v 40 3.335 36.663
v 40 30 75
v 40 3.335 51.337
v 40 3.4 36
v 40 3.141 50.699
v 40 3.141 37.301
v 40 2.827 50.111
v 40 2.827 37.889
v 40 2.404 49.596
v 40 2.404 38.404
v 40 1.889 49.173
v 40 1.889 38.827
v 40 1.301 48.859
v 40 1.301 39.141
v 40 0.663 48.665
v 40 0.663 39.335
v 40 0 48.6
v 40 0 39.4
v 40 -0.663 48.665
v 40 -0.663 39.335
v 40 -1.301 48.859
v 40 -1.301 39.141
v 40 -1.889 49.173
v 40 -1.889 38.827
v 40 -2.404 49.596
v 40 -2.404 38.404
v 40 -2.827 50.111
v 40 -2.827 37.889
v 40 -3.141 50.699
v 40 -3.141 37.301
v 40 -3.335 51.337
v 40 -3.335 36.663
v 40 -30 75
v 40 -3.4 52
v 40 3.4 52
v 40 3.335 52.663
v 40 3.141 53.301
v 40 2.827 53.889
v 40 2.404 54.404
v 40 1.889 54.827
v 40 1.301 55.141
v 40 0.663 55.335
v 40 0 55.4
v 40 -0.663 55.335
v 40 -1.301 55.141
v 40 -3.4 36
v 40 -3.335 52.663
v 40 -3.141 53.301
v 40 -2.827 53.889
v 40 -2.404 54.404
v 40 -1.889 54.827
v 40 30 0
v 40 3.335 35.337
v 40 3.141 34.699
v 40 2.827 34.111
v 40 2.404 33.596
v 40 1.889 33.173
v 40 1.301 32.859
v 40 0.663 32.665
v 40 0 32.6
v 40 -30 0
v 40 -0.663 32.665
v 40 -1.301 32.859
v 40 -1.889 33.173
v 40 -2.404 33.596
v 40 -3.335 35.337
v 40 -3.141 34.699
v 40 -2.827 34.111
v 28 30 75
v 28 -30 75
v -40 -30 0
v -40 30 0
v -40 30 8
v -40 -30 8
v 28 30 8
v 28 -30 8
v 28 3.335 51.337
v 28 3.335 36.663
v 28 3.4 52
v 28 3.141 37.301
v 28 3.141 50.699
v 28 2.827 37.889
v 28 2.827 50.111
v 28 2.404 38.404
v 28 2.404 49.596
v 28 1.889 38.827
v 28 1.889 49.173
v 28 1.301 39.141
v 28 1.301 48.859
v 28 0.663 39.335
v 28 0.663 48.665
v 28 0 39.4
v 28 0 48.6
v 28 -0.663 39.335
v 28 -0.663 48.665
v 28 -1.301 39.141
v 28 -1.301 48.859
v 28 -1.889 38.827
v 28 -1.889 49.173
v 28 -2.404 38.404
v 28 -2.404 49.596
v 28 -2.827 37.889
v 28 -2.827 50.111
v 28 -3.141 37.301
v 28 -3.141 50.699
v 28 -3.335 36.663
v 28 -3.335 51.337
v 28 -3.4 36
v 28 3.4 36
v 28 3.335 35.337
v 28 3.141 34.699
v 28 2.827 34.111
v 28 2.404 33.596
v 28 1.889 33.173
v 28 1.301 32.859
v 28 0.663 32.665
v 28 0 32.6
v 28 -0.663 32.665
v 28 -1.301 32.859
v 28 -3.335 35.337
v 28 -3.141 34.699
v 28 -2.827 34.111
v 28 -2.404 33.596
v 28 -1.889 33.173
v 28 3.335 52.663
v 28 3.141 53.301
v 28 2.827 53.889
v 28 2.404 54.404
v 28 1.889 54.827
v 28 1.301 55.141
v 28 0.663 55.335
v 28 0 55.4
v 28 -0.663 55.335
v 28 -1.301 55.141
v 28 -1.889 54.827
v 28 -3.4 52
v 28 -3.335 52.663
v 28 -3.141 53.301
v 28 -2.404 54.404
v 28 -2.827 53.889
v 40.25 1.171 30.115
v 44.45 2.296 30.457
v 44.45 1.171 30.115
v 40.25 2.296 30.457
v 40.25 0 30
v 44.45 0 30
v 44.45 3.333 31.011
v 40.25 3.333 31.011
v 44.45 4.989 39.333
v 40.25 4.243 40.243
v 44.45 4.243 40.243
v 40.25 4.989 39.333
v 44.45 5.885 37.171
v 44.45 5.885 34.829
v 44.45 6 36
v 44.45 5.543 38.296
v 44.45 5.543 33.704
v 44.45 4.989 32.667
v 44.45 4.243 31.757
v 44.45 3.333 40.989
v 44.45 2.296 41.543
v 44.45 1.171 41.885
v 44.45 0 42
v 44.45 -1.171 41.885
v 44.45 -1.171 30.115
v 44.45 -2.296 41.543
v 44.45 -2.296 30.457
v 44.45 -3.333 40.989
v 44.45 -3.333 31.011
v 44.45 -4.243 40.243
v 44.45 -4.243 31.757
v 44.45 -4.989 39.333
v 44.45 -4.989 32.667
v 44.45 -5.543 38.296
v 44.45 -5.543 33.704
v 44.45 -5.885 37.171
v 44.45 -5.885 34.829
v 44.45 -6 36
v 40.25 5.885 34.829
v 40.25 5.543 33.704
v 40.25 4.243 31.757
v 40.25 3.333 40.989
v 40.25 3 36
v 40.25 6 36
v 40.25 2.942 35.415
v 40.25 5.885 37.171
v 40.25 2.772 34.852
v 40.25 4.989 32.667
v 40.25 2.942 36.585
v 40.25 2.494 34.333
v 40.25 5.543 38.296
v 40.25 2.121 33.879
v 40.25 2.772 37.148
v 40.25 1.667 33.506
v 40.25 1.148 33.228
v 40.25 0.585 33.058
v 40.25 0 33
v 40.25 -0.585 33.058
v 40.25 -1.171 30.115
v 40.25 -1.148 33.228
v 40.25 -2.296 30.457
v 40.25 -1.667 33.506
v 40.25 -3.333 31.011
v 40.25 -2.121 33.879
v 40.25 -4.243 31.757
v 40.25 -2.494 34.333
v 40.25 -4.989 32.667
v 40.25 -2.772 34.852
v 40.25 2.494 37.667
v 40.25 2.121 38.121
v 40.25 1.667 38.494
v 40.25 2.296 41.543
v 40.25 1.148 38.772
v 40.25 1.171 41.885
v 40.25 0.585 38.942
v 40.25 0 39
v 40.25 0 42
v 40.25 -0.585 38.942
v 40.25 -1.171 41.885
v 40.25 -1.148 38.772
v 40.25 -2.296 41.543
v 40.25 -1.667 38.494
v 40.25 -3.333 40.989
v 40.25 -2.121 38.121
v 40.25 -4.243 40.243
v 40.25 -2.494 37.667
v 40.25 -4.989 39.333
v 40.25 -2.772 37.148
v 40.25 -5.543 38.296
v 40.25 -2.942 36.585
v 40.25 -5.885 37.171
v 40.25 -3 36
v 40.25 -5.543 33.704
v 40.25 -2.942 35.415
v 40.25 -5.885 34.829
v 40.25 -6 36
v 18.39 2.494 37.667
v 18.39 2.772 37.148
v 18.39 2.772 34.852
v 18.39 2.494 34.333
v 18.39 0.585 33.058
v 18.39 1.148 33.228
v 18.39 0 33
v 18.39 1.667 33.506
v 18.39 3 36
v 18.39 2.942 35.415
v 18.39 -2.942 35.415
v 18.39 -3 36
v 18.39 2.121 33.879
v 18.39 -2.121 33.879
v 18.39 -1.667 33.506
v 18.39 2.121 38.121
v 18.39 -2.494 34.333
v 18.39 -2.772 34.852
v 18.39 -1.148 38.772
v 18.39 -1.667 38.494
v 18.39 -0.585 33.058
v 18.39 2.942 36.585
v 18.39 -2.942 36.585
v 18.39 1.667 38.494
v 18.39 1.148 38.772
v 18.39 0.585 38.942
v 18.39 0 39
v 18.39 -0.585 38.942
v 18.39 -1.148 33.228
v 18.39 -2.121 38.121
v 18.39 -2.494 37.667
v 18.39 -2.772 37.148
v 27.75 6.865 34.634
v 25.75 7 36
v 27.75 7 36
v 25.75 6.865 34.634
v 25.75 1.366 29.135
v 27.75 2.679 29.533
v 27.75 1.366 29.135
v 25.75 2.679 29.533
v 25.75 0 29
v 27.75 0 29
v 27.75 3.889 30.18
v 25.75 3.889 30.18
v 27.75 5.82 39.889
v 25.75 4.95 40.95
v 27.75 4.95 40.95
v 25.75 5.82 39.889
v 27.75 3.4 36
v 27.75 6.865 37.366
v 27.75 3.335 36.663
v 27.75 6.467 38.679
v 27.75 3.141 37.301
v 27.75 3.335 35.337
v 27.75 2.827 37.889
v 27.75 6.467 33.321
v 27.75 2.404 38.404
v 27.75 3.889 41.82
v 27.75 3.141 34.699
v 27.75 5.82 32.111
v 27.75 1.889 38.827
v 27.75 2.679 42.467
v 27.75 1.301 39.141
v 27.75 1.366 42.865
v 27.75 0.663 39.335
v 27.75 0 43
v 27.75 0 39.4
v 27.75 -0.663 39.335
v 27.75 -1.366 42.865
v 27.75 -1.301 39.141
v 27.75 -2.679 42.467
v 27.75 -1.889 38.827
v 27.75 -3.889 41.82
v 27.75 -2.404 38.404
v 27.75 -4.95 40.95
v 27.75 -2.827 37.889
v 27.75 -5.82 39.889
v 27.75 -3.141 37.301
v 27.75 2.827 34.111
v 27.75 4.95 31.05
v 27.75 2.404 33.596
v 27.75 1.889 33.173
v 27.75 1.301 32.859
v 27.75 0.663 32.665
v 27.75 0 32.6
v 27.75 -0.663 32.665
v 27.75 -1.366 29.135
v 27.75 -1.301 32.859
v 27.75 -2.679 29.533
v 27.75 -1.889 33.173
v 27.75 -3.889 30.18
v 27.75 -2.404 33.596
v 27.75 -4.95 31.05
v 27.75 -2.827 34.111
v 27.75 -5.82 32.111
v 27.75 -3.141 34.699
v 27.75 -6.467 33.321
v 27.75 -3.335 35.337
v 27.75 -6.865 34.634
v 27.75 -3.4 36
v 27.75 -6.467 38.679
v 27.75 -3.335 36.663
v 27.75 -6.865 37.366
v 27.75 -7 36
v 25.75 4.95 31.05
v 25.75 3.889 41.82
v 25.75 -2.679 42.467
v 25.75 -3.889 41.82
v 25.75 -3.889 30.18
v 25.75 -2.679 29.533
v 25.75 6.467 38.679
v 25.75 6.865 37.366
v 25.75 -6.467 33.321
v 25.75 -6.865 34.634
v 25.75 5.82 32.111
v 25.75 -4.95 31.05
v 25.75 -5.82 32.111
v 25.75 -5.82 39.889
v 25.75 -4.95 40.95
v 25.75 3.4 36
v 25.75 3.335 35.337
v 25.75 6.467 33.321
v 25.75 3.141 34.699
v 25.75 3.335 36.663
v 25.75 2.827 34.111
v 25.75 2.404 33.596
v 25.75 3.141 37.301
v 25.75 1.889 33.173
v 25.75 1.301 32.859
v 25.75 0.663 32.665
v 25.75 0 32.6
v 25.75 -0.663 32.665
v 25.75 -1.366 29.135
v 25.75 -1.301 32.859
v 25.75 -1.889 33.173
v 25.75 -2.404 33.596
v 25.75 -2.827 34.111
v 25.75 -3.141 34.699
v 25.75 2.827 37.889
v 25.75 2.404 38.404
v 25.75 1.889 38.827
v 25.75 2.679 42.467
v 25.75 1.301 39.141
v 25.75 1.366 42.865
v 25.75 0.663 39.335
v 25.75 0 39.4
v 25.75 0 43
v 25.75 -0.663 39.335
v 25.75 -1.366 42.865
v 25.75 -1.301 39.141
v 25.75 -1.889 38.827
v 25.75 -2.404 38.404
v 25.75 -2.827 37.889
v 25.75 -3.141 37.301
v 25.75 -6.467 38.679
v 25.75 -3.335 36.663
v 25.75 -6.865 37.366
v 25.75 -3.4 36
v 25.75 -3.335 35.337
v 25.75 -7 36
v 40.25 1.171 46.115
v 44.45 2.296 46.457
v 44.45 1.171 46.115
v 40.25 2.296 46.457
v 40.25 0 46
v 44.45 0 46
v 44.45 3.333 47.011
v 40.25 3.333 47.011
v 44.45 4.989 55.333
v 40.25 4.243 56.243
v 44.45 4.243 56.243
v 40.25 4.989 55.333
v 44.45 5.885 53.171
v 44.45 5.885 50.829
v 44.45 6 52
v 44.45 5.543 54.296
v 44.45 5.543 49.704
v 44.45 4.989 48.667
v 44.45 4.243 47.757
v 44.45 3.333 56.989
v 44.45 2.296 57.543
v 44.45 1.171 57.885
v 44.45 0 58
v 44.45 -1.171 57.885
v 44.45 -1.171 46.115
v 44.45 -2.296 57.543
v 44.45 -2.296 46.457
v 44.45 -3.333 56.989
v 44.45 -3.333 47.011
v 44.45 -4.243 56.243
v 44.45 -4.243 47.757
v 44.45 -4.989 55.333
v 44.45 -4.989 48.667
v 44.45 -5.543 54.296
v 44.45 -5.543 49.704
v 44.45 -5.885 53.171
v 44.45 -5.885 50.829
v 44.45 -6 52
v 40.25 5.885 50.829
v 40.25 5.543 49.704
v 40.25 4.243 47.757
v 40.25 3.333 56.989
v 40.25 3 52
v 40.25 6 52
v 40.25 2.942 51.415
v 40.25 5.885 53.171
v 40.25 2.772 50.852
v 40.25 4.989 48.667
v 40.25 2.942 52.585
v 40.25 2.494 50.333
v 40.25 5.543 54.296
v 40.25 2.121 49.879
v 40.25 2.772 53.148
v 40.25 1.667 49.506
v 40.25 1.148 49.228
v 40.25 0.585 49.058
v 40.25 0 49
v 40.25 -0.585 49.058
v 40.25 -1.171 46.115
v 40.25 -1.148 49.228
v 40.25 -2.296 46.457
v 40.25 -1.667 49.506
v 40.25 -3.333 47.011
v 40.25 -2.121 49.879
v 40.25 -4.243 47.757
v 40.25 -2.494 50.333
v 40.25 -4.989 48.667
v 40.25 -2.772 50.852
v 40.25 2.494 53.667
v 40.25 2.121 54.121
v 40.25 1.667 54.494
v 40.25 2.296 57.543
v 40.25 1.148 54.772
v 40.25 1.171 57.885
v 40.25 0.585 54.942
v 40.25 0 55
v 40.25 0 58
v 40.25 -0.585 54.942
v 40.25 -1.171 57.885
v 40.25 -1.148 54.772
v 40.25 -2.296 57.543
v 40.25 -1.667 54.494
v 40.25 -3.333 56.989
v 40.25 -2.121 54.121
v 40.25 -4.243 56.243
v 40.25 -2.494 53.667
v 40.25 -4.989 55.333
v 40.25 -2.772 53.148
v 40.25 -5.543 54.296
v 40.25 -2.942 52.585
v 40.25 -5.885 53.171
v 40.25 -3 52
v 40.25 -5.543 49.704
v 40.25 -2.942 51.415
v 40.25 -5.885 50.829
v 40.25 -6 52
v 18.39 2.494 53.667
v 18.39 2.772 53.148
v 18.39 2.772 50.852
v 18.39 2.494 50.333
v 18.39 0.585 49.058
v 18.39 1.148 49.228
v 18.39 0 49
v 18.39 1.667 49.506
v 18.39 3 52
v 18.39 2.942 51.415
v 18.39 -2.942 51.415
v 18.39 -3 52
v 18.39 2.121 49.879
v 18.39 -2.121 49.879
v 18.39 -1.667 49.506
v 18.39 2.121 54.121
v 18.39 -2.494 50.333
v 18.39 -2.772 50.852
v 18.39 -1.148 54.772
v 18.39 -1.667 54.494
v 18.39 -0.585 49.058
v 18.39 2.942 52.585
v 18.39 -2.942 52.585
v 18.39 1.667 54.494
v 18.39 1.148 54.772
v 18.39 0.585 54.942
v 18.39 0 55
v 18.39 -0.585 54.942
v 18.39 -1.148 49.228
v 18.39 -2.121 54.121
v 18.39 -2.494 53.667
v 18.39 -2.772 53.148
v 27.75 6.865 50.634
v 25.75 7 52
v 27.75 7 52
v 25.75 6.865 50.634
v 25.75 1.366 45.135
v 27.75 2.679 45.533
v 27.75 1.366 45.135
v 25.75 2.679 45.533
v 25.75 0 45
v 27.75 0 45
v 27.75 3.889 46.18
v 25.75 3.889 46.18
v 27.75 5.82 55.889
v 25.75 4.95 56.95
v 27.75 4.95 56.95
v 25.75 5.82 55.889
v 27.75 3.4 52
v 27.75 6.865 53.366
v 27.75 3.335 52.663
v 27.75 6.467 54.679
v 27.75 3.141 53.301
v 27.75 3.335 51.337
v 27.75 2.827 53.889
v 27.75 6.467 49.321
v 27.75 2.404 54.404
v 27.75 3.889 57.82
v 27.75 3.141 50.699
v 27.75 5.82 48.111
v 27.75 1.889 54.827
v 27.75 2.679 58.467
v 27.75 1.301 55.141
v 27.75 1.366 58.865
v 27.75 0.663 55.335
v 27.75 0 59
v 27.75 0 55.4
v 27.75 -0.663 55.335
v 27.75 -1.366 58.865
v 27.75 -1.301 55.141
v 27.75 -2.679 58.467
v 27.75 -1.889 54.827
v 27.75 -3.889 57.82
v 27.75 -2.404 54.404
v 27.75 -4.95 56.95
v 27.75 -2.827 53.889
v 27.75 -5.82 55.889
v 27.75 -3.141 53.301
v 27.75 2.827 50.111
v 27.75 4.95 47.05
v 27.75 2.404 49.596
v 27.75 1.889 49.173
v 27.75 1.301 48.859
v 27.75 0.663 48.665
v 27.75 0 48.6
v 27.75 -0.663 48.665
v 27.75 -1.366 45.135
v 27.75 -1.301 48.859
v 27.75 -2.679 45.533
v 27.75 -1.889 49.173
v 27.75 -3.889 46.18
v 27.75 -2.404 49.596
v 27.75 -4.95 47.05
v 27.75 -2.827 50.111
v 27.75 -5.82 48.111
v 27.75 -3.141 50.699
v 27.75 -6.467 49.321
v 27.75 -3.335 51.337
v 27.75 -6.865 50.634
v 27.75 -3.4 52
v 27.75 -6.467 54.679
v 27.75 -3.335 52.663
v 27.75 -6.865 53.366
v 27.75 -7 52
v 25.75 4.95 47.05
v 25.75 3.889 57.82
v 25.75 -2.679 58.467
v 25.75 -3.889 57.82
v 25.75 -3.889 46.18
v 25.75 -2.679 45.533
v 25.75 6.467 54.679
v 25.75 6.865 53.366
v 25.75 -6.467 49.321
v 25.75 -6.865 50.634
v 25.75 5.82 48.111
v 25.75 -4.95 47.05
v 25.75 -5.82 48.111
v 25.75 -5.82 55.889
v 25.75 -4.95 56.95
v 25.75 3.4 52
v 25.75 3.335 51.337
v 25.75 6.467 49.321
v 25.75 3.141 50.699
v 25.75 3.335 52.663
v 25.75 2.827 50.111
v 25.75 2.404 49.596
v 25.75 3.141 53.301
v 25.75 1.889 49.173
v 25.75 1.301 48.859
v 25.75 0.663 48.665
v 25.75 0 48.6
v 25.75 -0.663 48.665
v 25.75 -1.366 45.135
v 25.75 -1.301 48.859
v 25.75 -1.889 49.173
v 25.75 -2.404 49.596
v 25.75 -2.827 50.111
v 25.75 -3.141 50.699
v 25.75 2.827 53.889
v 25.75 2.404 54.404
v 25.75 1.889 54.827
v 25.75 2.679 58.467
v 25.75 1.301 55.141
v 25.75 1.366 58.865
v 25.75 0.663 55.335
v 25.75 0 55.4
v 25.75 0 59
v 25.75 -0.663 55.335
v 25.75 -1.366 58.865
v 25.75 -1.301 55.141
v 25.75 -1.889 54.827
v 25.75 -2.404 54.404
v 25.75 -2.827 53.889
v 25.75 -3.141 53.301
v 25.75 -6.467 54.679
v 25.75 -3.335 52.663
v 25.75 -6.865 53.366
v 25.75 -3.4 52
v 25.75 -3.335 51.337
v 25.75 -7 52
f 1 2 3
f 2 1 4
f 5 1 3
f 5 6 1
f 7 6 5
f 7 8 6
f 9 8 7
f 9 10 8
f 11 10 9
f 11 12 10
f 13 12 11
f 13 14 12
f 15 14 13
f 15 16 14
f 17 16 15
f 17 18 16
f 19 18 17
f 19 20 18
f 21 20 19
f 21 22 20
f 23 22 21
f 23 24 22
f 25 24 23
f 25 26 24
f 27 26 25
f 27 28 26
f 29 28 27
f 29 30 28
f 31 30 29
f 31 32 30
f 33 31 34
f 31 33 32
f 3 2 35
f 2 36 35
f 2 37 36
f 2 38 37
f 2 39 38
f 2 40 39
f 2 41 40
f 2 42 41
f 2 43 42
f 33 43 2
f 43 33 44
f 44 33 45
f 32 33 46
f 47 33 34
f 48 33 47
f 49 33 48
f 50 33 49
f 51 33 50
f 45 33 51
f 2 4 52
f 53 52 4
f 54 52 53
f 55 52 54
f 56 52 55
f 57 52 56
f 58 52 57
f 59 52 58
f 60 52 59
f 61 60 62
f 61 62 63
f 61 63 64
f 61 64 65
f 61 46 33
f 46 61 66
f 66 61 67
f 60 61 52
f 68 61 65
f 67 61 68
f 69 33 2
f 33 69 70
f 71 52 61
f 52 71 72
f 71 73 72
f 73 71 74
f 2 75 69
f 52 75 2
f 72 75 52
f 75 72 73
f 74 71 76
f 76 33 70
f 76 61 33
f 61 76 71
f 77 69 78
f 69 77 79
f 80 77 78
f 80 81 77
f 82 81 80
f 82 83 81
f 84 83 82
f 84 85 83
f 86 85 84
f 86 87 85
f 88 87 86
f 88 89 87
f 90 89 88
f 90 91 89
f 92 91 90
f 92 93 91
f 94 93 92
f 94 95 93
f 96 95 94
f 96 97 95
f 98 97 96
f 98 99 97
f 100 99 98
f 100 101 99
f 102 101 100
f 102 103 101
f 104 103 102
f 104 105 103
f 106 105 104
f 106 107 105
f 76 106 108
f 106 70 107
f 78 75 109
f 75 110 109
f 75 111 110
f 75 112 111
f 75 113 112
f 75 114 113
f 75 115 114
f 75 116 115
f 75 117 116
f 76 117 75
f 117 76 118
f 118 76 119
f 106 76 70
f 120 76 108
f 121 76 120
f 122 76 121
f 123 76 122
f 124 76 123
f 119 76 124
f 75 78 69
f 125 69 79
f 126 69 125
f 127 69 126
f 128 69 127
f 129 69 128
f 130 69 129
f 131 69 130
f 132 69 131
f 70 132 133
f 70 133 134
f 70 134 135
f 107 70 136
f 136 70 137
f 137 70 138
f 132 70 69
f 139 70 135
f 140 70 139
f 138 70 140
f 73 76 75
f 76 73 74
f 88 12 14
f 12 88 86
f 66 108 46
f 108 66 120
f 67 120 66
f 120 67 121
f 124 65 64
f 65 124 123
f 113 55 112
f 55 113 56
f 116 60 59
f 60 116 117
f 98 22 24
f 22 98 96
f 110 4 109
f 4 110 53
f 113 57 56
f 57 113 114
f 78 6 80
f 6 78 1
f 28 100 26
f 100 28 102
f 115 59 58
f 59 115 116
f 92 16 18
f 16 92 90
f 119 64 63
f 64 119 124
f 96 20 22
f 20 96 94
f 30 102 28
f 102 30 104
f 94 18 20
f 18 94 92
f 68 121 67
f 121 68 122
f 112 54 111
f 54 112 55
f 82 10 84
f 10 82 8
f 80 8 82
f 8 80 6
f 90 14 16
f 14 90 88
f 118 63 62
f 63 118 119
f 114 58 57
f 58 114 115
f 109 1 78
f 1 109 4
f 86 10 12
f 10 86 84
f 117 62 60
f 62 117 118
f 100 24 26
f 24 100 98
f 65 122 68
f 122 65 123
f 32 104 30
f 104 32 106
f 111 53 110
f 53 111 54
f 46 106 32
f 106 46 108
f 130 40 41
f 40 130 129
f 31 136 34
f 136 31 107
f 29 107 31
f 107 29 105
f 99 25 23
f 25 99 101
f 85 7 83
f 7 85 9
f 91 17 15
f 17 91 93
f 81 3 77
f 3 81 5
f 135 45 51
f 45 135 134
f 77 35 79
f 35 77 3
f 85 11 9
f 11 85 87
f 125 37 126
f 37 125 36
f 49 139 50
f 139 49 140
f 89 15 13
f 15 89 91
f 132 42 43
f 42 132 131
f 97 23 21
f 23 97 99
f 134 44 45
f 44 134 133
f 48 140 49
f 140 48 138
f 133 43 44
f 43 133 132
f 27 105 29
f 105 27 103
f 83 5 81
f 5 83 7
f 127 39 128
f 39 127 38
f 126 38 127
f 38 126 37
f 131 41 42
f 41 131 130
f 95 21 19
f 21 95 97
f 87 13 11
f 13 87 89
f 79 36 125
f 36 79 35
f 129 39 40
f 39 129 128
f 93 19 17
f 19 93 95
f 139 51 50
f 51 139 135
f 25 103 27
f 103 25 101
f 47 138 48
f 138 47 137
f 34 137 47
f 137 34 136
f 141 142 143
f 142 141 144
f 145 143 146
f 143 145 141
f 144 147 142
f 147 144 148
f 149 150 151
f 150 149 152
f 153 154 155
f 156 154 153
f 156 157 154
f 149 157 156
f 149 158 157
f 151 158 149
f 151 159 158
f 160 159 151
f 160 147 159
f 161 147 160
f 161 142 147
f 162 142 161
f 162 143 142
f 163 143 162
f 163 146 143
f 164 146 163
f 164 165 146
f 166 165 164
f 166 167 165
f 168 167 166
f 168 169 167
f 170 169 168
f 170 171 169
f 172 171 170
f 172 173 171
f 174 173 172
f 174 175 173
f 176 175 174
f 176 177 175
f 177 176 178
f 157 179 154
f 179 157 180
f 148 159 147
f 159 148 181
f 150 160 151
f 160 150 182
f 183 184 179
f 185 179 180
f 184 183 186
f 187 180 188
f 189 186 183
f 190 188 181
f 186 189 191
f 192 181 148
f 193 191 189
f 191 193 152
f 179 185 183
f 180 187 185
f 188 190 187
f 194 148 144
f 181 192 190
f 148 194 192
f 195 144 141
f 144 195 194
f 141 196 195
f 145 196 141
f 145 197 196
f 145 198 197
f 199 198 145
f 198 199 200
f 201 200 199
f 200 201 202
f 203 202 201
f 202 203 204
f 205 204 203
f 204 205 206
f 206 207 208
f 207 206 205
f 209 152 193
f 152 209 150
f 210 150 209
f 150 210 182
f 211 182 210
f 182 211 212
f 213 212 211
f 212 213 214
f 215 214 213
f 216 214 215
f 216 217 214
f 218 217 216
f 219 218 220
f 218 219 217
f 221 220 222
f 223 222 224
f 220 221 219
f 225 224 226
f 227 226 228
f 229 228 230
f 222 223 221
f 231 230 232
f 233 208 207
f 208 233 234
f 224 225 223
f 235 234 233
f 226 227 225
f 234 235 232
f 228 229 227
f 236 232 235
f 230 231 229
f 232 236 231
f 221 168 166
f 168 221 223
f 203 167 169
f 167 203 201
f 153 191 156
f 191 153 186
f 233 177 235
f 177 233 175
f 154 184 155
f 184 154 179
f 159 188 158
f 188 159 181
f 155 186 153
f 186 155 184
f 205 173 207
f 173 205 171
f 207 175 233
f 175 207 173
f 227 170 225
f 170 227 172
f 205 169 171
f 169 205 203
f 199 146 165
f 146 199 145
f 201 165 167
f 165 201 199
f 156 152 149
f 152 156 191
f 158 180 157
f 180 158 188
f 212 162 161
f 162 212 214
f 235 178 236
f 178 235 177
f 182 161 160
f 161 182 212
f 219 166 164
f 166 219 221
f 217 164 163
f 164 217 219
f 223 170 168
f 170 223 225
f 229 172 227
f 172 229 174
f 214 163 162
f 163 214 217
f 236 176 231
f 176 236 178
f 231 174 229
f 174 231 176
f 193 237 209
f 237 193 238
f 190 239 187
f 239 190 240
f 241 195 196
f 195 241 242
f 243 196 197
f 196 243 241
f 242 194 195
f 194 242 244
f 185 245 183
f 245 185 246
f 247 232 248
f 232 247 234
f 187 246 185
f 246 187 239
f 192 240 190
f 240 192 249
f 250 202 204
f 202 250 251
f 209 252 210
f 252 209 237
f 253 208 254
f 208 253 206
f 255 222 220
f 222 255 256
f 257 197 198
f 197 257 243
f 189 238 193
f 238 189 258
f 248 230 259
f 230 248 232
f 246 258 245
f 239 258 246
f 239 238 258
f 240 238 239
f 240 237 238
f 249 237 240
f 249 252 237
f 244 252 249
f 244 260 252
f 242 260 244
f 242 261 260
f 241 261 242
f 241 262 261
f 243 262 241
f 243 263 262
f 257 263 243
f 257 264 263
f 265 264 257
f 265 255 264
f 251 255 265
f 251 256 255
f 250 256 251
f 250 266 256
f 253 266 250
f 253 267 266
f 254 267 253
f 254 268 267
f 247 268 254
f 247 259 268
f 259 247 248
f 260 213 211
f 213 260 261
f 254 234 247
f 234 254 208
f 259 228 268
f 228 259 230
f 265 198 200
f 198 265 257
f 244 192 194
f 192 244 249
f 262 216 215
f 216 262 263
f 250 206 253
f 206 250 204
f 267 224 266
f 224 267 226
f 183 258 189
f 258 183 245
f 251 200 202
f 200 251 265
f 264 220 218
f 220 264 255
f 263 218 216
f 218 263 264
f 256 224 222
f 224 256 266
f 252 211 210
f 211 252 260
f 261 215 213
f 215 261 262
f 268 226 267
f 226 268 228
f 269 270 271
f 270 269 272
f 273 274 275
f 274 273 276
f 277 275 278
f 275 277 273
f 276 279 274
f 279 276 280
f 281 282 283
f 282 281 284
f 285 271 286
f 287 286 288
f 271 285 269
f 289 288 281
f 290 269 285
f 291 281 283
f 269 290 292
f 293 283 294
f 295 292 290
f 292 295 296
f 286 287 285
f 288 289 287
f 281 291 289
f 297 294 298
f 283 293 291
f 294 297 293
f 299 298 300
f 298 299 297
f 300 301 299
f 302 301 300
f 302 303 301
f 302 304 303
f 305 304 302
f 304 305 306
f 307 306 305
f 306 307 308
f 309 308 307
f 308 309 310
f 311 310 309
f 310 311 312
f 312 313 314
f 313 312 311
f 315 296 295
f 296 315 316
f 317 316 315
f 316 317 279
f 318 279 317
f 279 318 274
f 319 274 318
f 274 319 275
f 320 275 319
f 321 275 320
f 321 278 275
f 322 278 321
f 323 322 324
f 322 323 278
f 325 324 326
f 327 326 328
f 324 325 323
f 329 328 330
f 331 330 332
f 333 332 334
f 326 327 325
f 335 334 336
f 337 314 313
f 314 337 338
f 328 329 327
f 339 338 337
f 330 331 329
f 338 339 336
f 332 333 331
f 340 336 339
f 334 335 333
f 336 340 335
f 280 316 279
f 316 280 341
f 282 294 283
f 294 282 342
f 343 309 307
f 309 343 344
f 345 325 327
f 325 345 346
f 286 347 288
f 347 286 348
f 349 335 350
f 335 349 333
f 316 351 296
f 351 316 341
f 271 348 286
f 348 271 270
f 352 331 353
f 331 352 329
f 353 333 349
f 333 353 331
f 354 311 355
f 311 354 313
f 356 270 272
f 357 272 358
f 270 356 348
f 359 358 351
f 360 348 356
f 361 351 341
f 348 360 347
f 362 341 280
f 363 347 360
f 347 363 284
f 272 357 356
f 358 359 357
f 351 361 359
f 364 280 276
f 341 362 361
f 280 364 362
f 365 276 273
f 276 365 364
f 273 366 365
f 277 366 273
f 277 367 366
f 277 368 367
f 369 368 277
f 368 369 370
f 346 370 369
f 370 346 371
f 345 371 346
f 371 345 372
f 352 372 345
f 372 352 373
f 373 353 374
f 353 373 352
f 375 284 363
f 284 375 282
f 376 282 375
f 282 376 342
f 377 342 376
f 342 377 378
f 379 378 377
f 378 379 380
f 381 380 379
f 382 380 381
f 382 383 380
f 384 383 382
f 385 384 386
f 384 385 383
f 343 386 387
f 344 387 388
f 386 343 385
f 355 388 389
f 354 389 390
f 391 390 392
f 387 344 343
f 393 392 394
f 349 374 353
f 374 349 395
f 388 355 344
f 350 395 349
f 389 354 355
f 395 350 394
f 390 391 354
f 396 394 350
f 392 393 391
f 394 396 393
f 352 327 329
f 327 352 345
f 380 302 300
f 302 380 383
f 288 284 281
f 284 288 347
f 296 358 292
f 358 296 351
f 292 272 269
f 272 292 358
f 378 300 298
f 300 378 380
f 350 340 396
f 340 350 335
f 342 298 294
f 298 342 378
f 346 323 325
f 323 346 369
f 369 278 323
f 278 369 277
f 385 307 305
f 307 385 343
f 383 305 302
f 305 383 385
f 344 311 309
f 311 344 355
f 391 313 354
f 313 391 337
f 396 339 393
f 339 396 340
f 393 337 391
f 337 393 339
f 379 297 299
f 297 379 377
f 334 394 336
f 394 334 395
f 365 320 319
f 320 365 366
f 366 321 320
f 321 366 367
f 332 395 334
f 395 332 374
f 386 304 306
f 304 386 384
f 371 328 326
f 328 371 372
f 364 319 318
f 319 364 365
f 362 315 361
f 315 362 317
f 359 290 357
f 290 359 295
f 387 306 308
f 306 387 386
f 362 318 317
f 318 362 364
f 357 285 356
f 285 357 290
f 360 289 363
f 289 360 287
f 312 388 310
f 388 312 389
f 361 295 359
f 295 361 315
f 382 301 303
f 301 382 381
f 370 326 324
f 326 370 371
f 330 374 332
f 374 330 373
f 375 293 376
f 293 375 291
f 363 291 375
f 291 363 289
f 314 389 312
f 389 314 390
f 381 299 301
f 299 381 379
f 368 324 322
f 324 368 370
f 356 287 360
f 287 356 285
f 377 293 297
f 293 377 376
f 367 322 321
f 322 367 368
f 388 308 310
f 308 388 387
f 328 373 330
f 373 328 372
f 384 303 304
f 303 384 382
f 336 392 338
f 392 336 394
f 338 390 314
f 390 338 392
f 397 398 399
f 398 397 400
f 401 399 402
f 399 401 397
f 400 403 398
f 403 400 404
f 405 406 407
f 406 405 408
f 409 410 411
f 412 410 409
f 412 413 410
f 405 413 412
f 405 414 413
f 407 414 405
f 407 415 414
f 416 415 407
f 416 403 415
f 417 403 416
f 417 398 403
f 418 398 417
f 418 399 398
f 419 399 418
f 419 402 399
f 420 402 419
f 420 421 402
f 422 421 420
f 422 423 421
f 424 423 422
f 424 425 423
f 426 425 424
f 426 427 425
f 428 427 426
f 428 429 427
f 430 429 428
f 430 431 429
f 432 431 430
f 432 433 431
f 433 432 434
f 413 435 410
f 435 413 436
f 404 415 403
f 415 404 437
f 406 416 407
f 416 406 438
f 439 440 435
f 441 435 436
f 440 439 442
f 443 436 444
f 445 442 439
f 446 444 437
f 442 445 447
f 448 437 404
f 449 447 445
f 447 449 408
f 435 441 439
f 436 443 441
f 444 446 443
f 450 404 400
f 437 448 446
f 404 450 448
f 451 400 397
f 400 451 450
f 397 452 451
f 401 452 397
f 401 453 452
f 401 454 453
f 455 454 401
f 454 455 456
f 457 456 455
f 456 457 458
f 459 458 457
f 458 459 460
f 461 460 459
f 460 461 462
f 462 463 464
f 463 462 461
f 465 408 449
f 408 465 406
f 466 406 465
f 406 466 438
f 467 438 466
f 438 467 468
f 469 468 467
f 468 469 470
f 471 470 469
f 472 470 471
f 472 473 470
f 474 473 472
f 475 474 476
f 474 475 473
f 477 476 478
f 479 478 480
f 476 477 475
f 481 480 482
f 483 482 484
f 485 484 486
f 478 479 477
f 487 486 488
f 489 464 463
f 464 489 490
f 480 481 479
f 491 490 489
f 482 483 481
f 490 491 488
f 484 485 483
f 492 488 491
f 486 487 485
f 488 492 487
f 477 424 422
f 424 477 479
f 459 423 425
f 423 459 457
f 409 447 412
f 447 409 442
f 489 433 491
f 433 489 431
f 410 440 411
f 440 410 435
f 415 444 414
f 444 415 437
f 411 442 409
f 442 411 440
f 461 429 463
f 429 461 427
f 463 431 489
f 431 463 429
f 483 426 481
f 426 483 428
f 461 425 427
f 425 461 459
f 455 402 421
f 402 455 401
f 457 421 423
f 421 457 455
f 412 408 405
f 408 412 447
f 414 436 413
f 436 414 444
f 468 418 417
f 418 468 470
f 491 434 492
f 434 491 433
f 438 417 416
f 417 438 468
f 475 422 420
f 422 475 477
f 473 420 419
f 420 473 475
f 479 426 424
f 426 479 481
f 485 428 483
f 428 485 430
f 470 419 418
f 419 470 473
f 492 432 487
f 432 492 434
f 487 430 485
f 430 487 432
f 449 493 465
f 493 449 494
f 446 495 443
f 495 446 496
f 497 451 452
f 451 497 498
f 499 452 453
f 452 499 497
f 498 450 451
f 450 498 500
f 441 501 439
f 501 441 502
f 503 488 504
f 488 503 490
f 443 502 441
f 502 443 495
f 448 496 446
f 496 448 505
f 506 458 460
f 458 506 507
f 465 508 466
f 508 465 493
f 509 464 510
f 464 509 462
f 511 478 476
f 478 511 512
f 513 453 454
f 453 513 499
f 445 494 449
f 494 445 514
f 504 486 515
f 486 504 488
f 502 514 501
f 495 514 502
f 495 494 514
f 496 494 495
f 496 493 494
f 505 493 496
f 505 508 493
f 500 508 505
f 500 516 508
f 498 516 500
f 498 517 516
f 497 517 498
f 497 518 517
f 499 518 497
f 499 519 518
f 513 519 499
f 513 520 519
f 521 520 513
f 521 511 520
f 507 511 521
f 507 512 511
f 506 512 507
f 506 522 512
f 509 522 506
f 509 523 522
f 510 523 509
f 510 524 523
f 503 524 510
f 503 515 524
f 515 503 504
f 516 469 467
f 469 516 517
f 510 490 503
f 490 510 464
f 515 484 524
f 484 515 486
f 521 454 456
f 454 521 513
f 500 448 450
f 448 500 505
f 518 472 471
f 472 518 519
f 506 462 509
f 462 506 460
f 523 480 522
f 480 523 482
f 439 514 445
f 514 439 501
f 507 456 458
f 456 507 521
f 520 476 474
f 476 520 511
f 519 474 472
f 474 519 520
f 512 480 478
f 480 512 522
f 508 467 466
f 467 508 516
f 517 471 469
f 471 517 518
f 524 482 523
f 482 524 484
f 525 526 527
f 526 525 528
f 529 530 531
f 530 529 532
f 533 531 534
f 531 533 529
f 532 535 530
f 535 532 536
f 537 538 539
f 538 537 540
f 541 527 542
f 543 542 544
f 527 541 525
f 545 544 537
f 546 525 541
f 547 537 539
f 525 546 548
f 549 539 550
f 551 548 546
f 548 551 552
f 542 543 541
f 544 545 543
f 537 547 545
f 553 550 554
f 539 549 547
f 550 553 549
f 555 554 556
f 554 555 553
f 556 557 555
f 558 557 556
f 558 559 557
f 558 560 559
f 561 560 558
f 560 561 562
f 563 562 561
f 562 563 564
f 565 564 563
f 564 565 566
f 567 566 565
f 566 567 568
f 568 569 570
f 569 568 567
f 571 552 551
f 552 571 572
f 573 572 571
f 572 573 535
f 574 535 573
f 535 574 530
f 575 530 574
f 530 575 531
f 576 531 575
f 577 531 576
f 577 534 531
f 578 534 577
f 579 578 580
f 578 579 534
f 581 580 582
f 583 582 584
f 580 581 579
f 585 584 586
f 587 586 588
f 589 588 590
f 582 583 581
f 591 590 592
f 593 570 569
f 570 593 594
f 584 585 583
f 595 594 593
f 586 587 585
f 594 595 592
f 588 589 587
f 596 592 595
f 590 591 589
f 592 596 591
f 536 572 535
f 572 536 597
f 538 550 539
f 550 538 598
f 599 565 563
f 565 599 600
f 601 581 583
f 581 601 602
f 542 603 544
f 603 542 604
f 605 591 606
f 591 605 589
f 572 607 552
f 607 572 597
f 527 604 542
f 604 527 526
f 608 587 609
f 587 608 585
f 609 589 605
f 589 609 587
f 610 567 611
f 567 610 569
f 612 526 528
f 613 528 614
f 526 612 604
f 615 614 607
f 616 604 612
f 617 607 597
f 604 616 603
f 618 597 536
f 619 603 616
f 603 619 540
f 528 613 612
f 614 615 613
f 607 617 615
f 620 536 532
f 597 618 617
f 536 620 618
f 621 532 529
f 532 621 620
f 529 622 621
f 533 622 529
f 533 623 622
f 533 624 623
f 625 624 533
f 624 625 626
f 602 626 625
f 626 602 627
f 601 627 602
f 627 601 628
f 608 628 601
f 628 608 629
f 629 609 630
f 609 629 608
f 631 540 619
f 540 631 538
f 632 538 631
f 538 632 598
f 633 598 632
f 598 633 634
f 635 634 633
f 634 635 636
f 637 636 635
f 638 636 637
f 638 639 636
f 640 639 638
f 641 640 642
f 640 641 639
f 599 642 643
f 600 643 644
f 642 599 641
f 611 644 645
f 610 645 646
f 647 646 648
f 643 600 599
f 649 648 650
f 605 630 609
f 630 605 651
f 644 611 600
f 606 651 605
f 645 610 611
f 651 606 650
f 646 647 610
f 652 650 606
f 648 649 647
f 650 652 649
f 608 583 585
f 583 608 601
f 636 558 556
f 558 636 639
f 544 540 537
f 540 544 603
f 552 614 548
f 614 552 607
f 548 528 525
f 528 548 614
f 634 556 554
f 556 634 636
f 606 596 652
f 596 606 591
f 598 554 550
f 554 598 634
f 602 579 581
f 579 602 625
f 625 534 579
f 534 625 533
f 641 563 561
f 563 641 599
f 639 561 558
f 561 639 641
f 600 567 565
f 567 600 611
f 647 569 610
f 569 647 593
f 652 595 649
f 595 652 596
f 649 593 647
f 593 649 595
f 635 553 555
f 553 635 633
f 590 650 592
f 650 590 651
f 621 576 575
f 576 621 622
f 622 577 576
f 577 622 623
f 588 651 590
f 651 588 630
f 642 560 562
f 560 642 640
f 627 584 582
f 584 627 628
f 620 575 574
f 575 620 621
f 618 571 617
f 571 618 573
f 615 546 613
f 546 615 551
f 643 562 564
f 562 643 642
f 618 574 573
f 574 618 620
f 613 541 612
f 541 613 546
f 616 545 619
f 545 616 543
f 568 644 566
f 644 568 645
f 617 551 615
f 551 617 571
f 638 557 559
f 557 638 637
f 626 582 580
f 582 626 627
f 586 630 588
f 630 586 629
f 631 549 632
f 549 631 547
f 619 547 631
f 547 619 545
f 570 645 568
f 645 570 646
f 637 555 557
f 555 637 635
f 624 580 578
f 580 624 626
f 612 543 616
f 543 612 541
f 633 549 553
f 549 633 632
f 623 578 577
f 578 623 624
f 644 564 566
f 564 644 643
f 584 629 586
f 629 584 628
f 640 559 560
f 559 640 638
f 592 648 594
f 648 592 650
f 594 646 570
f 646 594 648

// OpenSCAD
$fn = 32;

// ------------------------------------------------------------------------
// Bolted bracket: 80 x 60 mm bracket with 2 bolt joints
// Every part is its own module, assembly() places them once.
// ------------------------------------------------------------------------

// --- part 1 ---
module bracket() {
  difference() {
    translate([-40, -30, 0]) cube([80, 60, 75]);
    translate([-41, -31, 8]) cube([69, 62, 68]);
    translate([34, 0, 36]) rotate([0, 90, 0]) cylinder(h = 14, d = 6.8, center = true);
    translate([34, 0, 52]) rotate([0, 90, 0]) cylinder(h = 14, d = 6.8, center = true);
  }
}

// --- part 2 ---
module bolt1() {
  cylinder(h = 4.2, d = 12);
  translate([0, 0, -21.86]) cylinder(h = 21.86, d = 6);
}

// --- part 3 ---
module washer1() {
  difference() {
      translate([0, 0, 0]) cylinder(h = 2, d = 14);
      translate([0, 0, -1]) cylinder(h = 4, d = 6.8);
    }
}

// --- part 4 ---
module bolt2() {
  cylinder(h = 4.2, d = 12);
  translate([0, 0, -21.86]) cylinder(h = 21.86, d = 6);
}

// --- part 5 ---
module washer2() {
  difference() {
      translate([0, 0, 0]) cylinder(h = 2, d = 14);
      translate([0, 0, -1]) cylinder(h = 4, d = 6.8);
    }
}

// --- assembly ---
module assembly() {
  translate([0, 0, 0]) rotate([0, 0, 0]) bracket();
  translate([40.25, 0, 36]) rotate([0, 90, 0]) bolt1();
  translate([25.75, 0, 36]) rotate([0, 90, 0]) washer1();
  translate([40.25, 0, 52]) rotate([0, 90, 0]) bolt2();
  translate([25.75, 0, 52]) rotate([0, 90, 0]) washer2();
}

assembly();
